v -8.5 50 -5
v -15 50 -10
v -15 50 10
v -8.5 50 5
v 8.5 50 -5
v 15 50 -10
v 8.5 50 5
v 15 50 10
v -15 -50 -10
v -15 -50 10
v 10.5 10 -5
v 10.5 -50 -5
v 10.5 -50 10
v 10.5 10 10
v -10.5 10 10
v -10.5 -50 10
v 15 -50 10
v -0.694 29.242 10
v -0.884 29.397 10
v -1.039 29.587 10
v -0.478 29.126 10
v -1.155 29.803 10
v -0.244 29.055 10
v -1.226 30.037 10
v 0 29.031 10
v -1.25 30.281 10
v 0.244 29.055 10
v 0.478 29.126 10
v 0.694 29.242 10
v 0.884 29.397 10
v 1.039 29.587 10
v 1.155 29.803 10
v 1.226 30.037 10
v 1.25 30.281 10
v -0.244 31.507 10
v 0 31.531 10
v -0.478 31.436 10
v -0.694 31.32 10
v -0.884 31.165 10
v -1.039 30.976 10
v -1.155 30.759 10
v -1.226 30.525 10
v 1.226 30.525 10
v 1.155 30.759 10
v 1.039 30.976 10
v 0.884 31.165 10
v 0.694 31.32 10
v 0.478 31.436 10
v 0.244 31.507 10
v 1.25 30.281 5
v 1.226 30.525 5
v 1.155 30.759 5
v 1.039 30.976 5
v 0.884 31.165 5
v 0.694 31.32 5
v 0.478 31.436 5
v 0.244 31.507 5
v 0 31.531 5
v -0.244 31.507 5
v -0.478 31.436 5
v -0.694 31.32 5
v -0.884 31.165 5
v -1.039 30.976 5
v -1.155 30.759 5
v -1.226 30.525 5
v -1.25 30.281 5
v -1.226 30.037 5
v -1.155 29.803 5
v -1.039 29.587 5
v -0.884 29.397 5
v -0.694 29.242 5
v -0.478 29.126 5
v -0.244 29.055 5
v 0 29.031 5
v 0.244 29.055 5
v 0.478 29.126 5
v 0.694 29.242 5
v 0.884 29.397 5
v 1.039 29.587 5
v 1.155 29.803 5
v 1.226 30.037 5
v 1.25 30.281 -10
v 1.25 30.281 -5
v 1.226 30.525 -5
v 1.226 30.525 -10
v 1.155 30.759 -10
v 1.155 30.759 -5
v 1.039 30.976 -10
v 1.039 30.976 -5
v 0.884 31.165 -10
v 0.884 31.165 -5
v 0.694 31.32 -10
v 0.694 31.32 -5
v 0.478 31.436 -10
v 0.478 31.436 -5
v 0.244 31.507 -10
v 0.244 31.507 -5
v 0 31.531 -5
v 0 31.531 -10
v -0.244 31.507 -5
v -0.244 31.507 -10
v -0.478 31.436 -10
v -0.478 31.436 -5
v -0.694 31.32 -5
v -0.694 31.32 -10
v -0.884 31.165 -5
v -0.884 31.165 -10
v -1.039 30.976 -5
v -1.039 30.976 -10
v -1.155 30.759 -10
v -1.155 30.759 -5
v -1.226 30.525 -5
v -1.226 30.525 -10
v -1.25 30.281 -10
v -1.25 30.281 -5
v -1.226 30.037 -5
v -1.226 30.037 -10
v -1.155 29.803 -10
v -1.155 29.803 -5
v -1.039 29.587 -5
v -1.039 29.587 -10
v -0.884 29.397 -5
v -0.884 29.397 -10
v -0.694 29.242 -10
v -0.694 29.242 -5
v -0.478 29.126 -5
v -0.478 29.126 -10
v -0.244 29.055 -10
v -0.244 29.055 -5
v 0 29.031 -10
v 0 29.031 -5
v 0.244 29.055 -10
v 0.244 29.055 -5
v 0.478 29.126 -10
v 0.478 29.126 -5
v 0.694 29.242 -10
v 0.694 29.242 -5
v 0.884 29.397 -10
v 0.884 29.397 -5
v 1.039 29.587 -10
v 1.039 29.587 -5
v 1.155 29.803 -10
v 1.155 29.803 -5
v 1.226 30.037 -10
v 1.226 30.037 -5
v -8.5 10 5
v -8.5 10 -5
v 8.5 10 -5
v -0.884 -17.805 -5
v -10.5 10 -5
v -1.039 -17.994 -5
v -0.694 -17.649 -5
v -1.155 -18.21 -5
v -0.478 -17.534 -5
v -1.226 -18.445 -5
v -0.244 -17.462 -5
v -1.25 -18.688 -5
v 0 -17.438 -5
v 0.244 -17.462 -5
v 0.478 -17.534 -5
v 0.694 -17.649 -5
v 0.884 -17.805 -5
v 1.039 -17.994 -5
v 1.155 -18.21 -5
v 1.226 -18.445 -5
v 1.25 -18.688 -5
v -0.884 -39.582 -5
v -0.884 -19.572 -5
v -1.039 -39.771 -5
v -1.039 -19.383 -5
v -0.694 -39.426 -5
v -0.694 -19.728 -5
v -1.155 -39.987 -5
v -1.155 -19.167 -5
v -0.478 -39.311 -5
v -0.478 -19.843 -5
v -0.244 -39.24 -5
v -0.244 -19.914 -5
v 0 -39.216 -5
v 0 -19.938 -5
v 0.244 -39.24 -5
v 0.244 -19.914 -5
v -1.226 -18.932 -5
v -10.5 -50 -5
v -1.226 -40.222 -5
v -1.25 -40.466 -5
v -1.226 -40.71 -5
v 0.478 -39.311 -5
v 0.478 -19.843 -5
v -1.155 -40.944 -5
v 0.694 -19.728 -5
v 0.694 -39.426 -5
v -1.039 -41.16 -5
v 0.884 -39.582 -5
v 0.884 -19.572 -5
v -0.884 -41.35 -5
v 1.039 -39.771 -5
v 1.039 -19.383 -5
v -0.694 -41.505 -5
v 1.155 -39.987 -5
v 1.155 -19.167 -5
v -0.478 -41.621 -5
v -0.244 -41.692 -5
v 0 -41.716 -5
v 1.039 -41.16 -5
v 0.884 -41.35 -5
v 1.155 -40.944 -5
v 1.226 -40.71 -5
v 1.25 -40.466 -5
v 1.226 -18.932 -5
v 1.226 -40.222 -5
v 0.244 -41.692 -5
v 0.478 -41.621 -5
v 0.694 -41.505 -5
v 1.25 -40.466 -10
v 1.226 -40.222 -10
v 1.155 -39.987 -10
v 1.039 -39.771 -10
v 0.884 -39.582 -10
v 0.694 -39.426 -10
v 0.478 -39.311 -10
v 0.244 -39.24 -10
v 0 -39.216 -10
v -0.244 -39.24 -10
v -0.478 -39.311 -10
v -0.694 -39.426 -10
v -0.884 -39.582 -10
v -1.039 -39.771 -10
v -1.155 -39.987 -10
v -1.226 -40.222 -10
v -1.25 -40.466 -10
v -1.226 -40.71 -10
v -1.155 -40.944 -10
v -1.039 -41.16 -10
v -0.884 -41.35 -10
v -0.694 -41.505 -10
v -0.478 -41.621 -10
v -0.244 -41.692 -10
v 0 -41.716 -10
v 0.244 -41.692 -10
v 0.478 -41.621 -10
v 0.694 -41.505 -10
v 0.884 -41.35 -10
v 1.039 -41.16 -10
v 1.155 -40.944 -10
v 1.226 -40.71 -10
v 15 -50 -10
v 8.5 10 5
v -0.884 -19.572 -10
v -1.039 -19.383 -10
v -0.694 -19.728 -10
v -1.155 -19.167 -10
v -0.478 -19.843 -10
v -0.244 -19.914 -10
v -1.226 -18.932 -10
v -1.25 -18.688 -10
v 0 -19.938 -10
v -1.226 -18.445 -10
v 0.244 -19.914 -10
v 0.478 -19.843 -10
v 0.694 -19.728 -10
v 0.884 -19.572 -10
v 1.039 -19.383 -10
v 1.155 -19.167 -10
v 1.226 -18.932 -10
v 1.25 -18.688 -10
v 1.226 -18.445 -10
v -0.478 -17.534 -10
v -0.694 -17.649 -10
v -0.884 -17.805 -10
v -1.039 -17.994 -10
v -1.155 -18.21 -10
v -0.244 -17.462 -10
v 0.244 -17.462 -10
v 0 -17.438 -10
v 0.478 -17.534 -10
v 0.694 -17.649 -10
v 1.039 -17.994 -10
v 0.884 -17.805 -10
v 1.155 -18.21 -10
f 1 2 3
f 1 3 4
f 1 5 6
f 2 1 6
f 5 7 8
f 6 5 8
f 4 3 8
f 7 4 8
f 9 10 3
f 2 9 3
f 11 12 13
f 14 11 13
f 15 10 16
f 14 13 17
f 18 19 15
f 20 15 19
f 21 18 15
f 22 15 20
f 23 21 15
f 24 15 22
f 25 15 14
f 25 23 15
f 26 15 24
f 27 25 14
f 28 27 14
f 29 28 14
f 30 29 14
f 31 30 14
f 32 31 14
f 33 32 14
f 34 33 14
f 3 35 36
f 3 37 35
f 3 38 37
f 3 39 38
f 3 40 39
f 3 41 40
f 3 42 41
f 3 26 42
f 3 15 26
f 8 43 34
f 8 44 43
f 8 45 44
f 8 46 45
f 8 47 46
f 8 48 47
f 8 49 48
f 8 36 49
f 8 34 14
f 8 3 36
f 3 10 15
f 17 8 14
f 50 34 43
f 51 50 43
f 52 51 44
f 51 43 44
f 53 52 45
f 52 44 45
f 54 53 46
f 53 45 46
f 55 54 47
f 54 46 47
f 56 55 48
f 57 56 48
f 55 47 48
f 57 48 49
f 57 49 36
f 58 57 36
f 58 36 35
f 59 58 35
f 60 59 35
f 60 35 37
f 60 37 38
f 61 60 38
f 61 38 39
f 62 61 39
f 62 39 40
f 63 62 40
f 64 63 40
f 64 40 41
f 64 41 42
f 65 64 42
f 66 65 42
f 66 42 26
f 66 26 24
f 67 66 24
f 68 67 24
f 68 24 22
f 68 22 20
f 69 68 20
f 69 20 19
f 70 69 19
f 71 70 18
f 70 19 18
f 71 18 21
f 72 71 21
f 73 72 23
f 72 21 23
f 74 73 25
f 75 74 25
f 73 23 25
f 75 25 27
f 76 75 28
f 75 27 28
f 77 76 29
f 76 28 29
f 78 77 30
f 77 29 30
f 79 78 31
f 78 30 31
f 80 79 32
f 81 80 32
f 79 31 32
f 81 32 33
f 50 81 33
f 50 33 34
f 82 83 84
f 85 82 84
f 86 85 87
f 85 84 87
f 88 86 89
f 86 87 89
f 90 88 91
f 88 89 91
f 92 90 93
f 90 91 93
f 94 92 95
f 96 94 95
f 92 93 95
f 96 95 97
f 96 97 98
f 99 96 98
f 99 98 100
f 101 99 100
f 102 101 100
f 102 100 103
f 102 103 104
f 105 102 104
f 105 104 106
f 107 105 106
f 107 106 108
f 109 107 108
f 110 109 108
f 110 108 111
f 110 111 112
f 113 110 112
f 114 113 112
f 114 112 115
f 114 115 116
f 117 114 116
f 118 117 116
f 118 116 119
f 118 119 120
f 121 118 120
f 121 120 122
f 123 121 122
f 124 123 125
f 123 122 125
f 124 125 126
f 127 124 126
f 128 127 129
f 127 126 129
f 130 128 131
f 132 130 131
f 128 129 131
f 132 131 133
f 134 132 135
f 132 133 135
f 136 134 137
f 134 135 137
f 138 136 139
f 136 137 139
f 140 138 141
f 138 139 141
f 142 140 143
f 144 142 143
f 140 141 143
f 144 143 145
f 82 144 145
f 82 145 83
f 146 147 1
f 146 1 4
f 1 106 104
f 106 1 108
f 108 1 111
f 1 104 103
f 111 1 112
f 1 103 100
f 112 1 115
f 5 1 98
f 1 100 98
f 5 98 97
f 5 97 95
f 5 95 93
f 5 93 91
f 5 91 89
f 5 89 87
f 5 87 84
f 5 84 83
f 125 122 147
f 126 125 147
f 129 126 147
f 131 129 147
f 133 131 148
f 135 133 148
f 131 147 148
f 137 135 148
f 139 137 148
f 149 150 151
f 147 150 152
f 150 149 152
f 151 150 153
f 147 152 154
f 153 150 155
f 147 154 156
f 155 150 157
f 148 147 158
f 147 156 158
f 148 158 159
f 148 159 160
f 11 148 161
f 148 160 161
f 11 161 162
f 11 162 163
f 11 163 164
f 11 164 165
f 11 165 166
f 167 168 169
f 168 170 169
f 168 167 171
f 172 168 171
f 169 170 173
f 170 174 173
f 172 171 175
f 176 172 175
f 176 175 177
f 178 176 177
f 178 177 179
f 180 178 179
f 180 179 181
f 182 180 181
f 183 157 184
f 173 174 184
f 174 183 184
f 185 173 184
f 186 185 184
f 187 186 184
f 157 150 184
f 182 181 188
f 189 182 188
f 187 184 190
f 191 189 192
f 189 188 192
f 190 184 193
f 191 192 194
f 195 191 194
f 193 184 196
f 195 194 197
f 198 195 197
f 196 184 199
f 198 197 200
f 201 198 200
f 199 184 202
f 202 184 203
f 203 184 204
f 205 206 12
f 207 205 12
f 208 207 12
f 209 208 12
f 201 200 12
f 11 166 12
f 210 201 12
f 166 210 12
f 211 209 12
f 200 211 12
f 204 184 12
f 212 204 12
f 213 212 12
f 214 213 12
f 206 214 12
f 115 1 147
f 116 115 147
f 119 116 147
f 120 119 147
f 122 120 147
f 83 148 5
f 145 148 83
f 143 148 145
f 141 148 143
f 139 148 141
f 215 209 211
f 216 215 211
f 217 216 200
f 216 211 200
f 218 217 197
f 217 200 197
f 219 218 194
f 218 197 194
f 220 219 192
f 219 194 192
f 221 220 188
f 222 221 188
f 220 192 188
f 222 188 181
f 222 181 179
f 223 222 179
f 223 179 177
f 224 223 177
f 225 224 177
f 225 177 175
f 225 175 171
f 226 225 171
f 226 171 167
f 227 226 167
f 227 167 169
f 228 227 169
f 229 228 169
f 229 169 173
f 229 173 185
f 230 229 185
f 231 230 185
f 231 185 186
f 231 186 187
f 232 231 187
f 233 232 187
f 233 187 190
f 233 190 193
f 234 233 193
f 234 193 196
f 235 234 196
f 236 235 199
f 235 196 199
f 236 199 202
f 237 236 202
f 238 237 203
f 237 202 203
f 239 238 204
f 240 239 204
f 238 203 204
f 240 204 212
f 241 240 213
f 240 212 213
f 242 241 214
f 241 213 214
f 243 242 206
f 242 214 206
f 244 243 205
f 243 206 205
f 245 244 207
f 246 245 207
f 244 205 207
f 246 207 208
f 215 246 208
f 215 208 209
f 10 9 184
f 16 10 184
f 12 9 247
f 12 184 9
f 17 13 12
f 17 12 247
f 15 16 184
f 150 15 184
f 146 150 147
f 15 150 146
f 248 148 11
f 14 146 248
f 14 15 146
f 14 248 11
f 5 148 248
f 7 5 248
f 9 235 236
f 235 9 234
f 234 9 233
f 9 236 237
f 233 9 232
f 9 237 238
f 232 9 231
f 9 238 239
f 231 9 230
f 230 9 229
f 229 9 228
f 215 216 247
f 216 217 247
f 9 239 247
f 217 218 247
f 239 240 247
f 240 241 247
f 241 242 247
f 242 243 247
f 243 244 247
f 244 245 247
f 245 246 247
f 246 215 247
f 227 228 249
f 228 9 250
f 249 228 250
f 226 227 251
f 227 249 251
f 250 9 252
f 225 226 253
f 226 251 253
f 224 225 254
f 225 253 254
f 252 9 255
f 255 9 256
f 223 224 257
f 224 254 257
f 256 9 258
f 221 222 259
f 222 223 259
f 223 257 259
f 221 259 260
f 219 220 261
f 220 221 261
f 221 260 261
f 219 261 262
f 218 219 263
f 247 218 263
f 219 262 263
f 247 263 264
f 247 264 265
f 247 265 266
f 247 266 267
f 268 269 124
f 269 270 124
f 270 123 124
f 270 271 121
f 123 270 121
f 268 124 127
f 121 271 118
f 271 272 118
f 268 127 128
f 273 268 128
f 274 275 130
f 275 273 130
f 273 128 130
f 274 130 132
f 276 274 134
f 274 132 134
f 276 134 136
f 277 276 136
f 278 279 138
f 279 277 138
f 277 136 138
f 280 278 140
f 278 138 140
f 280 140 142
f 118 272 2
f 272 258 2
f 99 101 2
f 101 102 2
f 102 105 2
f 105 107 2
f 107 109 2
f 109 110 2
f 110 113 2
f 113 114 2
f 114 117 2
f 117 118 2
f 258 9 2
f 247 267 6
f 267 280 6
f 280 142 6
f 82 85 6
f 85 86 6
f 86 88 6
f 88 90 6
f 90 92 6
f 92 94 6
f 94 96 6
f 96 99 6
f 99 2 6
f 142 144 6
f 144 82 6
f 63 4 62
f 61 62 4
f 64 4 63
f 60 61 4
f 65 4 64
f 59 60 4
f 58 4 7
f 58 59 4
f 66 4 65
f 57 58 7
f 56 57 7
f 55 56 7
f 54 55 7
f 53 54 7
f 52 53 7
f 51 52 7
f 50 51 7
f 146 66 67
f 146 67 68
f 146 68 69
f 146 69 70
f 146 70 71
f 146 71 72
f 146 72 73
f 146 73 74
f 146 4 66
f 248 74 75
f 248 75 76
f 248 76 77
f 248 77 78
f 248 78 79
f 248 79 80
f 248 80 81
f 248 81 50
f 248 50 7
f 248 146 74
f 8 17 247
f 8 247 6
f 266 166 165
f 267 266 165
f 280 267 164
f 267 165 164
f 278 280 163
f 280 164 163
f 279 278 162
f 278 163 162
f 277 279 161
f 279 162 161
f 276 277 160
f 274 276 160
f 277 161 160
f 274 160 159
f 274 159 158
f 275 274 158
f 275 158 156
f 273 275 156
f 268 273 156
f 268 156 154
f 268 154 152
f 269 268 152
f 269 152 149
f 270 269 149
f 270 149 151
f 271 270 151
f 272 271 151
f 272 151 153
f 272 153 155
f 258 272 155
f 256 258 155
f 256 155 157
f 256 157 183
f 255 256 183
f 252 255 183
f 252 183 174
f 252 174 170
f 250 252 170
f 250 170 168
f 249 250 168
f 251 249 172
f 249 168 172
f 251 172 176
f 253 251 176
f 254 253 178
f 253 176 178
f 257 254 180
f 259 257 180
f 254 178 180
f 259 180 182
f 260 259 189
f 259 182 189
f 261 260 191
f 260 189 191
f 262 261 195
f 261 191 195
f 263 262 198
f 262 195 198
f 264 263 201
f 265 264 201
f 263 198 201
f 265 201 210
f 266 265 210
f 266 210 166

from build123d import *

# Parameters (mm, degrees)
F0_W     = 30
F0_H     = 100
F1_DEPTH = 10
F2_W     = 17
F2_H     = 10
F3_DEPTH = 200
F2_H_2   = 5
F4_DEPTH = 60
F5_R     = 1.25
F6_DEPTH = 25
F7_R     = 1.25
F8_DEPTH = 25


with BuildPart() as f1:
    # F0 (on Top) → F1 (new body, symmetric)
    with BuildSketch(Plane.XY):
        Rectangle(F0_W, F0_H)
    extrude(amount=F1_DEPTH, both=True)

    # F2 (on face) → F3 (cut)
    with BuildSketch(Plane.XZ.offset(50)):
        Rectangle(F2_W, F2_H)
    extrude(amount=-F3_DEPTH, mode=Mode.SUBTRACT)

    # F2 (on face) → F4 (cut)
    with BuildSketch(Plane.XZ.offset(50)):
        Polygon((8.5, 10), (8.5, 5), (8.5, -5), (10.5, -5), (10.5, 10), align=None)
        Polygon((-8.5, -5), (-8.5, 5), (-8.5, 10), (-10.5, 10), (-10.5, -5), align=None)
        with Locations((0, 7.5)):
            Rectangle(F2_W, F2_H_2)
    extrude(amount=-F4_DEPTH, mode=Mode.SUBTRACT)

    # F5 (on face) → F6 (cut)
    with BuildSketch(Plane.XY.offset(-5)):
        with Locations((0, -18.688429)):
            Circle(F5_R)
        with Locations((0, -40.465806)):
            Circle(F5_R)
    extrude(amount=-F6_DEPTH, mode=Mode.SUBTRACT)

    # F7 (on face) → F8 (cut)
    with BuildSketch(Plane.XY.offset(10)):
        with Locations((0, 30.281067)):
            Circle(F7_R)
    extrude(amount=-F8_DEPTH, mode=Mode.SUBTRACT)


solid = f1.part
